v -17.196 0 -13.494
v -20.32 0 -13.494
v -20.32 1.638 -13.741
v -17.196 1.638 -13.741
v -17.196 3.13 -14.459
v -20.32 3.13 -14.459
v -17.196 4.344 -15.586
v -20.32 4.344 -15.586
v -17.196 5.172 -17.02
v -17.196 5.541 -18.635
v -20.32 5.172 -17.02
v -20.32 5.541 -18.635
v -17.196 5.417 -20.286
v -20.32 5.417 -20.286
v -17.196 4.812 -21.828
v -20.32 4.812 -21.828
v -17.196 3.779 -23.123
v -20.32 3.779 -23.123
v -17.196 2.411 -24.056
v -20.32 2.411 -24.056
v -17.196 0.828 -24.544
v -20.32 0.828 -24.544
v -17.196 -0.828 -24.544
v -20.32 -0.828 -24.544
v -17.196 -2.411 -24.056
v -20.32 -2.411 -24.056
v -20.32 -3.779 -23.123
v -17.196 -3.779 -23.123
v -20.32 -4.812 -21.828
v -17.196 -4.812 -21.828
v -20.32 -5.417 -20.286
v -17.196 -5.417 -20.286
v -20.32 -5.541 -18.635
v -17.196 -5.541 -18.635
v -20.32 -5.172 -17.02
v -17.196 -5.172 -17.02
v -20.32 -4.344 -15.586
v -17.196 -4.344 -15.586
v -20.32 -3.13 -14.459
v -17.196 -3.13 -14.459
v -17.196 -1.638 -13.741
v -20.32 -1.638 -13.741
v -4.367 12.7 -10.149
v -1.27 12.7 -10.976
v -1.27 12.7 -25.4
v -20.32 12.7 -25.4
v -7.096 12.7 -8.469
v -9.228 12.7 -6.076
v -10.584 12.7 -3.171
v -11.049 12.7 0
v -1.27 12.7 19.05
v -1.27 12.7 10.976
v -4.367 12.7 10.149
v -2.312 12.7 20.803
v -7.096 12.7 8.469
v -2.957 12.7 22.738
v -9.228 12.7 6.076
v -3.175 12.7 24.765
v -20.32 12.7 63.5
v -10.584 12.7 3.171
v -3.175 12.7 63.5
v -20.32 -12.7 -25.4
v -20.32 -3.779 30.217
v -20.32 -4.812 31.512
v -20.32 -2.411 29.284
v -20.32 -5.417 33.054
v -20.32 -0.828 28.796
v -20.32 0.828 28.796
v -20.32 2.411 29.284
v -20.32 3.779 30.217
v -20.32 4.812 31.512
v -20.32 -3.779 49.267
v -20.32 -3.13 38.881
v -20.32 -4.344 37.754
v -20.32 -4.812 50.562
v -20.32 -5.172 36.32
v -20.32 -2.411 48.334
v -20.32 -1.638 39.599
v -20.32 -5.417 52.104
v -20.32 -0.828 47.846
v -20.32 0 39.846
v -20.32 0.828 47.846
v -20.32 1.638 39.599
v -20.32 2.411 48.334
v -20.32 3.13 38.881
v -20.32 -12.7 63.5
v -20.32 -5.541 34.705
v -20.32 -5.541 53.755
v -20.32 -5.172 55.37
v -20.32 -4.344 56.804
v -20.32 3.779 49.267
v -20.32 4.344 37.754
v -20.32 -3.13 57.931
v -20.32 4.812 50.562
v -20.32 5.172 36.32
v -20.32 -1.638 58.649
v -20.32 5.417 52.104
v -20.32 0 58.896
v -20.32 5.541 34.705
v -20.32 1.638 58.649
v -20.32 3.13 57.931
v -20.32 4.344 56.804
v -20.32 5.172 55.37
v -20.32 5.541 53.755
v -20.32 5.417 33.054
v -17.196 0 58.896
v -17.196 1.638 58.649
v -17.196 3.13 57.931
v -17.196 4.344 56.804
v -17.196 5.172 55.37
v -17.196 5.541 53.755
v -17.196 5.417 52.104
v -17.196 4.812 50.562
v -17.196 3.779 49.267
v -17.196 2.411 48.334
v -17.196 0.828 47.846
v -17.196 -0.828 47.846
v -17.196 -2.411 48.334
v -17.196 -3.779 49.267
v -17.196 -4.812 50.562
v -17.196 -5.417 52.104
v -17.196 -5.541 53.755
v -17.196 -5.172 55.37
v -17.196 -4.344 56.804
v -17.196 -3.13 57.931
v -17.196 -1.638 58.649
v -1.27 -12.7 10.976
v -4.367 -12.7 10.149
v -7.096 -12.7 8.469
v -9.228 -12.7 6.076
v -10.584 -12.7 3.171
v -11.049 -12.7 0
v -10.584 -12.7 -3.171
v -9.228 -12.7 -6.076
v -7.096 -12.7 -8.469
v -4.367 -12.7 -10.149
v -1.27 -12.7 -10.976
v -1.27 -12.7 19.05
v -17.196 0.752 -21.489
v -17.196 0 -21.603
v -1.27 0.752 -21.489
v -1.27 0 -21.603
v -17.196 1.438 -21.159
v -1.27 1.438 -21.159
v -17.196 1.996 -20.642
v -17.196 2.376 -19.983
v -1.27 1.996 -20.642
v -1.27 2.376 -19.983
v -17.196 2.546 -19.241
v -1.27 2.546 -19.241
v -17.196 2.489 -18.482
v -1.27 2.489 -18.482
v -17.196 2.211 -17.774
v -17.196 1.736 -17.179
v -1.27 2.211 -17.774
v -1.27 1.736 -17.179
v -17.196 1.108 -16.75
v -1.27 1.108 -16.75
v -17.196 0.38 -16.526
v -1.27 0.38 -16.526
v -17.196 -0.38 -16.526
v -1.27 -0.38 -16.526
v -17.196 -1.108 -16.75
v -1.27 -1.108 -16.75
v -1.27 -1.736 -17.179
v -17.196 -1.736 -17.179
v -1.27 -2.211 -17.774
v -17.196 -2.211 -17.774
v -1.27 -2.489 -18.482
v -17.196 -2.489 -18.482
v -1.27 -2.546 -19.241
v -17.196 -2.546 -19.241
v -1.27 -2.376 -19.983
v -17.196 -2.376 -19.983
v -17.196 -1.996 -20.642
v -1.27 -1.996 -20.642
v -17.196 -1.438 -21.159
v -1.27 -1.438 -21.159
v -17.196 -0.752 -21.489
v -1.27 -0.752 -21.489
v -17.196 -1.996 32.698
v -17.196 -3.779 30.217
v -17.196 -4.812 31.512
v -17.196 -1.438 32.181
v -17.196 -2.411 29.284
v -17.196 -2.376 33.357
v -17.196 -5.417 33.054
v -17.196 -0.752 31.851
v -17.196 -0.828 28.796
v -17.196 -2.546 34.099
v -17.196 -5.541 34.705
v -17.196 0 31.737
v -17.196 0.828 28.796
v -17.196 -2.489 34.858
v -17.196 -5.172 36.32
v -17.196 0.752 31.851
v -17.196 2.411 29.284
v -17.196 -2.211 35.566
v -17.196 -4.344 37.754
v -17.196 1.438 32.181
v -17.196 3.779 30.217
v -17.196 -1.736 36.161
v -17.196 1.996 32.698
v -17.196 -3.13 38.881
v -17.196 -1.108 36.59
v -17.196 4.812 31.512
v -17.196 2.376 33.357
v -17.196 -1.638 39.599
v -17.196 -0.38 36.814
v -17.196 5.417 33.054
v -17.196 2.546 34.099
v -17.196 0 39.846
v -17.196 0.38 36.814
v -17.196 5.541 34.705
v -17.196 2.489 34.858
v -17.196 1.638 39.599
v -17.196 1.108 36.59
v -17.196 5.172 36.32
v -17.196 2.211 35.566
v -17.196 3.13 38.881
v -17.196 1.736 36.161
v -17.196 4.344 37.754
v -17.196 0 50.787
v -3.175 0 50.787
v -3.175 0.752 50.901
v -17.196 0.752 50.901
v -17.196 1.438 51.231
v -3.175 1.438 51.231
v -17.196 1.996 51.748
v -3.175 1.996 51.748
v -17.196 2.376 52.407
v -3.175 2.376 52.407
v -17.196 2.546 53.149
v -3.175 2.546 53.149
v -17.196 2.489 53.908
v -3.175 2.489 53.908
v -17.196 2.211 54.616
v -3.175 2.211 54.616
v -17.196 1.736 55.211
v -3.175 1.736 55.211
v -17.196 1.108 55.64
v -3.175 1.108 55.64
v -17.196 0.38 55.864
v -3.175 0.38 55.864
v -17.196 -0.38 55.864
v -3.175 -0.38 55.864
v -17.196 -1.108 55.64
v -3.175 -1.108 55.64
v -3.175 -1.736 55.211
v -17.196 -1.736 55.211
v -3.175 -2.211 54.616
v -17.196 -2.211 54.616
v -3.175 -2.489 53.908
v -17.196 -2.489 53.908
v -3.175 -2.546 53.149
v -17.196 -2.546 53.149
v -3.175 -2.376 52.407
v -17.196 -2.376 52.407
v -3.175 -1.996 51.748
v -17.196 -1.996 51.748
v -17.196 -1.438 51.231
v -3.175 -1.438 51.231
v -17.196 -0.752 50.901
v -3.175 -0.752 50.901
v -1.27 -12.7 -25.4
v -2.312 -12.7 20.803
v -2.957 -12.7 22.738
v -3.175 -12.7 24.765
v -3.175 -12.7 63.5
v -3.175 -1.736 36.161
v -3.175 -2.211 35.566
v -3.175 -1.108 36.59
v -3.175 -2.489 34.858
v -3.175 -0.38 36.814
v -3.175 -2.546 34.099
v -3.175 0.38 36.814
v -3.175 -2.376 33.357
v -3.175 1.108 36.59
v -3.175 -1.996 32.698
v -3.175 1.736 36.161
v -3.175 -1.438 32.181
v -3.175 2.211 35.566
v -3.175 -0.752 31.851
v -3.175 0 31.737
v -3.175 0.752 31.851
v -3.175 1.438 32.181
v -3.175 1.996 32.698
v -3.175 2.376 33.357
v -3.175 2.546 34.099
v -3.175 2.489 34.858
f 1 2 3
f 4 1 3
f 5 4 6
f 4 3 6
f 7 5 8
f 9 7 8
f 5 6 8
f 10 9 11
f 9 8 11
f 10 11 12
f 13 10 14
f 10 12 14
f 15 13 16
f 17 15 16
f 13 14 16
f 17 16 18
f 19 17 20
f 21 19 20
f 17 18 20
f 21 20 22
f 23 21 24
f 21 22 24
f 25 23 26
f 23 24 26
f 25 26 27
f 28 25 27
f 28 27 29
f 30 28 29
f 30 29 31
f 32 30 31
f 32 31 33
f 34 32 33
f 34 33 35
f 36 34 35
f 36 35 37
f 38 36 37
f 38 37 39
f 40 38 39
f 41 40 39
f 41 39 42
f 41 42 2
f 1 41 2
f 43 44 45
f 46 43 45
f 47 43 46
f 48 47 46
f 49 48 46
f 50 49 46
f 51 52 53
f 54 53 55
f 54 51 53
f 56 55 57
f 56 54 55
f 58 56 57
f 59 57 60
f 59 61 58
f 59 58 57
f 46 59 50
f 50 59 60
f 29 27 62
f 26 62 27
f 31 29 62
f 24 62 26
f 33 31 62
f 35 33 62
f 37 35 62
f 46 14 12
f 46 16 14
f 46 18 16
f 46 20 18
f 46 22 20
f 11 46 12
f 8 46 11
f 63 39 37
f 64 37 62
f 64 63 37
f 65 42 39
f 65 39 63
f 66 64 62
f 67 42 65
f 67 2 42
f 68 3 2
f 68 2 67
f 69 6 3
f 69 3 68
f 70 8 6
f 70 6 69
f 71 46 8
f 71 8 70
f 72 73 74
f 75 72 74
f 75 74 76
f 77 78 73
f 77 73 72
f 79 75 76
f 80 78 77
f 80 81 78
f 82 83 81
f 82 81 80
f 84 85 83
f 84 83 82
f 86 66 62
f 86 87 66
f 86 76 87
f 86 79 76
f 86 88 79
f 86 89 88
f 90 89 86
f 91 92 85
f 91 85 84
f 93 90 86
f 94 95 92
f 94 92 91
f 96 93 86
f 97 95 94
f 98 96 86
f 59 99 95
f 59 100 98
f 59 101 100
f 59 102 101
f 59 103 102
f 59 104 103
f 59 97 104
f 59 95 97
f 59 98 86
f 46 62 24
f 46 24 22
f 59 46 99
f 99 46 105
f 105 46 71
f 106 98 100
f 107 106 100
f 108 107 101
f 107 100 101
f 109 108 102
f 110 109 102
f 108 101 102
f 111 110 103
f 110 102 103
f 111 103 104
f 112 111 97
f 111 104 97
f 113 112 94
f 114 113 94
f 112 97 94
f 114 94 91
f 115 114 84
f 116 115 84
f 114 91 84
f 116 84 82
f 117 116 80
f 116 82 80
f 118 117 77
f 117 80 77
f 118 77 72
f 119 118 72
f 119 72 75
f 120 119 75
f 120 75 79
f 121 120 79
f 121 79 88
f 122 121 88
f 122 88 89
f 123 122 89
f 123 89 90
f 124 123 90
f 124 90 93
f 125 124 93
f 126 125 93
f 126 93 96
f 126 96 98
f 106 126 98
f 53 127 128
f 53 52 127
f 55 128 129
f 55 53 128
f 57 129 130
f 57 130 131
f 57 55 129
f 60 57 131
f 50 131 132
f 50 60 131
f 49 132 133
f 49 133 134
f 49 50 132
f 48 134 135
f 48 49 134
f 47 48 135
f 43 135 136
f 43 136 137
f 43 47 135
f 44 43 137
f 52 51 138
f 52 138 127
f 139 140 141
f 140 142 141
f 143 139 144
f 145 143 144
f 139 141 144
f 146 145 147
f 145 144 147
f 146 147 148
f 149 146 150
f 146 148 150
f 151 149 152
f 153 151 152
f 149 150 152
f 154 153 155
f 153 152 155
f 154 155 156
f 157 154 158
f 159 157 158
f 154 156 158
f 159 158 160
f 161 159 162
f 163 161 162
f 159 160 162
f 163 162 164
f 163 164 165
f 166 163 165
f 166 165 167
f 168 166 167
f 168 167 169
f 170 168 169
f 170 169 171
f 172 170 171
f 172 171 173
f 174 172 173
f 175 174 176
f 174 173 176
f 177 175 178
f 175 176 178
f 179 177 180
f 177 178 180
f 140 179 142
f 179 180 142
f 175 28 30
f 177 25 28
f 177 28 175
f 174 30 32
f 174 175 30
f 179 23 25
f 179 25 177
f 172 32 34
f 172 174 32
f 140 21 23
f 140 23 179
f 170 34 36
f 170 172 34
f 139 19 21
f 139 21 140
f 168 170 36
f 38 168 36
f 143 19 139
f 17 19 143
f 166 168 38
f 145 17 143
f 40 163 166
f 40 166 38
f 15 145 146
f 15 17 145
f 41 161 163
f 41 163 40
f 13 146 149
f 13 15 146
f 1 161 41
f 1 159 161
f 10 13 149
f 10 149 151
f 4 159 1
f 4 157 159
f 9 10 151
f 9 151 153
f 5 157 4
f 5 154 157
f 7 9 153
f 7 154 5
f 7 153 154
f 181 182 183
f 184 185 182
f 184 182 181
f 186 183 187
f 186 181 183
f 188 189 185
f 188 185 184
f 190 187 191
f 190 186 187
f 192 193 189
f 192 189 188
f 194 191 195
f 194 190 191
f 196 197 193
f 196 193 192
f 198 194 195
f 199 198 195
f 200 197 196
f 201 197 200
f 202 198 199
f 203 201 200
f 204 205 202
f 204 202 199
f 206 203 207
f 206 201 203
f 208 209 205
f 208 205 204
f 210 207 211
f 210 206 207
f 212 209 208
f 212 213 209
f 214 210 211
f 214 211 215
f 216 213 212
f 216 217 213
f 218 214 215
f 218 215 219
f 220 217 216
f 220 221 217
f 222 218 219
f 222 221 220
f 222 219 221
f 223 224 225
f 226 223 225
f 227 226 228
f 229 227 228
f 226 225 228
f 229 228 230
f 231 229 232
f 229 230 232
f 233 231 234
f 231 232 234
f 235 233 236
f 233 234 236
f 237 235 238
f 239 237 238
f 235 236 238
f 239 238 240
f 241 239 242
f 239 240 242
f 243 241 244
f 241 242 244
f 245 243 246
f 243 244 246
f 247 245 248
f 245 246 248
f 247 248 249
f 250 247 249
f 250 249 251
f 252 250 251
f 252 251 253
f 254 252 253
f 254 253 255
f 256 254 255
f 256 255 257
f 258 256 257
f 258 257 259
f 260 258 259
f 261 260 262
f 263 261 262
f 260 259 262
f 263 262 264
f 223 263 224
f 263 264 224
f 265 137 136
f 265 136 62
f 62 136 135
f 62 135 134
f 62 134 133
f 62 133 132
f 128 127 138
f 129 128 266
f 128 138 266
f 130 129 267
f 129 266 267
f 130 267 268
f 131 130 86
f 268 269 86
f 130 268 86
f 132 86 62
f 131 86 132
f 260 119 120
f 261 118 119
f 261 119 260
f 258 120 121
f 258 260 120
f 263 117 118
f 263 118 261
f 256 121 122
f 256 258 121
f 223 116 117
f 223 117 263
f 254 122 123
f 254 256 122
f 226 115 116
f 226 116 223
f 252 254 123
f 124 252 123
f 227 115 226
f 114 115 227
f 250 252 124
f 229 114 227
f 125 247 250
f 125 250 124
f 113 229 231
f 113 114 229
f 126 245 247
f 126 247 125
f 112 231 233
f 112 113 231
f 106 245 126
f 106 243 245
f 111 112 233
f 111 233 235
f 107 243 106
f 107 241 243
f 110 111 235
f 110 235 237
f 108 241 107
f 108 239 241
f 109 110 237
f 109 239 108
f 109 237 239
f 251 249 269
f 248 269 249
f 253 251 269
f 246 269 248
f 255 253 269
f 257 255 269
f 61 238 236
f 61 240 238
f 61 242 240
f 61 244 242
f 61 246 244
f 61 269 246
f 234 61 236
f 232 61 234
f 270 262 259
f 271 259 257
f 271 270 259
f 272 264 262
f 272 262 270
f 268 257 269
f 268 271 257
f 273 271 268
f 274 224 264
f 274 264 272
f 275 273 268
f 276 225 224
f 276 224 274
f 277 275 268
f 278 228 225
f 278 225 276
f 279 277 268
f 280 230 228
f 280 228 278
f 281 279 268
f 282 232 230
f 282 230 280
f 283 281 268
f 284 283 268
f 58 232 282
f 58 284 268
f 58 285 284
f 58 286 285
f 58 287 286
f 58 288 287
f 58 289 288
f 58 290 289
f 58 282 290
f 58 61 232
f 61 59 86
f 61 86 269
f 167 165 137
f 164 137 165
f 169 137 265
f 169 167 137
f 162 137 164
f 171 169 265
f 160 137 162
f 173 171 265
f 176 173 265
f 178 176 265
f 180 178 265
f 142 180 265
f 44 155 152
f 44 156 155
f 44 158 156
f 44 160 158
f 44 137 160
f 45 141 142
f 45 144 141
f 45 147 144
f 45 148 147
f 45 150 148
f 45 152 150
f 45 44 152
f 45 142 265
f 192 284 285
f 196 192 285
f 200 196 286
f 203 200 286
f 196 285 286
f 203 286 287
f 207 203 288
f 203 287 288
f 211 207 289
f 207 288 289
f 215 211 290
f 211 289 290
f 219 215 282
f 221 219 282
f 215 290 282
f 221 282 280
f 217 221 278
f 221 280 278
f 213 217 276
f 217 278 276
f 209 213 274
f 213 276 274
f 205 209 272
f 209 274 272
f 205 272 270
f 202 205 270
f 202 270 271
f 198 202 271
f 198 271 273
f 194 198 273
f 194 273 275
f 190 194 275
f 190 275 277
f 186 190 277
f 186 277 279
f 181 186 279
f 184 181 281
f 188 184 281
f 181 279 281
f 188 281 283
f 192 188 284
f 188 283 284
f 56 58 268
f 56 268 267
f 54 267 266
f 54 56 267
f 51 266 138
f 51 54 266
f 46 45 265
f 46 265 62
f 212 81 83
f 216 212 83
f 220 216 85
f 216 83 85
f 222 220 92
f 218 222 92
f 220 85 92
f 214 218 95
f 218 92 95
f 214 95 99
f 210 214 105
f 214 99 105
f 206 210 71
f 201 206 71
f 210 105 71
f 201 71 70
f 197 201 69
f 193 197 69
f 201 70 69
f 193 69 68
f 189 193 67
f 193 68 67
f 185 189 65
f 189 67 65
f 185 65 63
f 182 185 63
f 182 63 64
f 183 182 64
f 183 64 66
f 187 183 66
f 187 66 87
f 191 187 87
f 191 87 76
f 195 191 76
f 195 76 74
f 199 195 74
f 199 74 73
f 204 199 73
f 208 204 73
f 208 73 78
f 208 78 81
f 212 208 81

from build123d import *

# Parameters (mm, degrees)
BOSS_EXTRUDE1_DEPTH                                 = 12.7
CBORE_FOR_10_BINDING_HEAD_MACHINE_SCREW_D           = 5.1054
CBORE_FOR_10_BINDING_HEAD_MACHINE_SCREW_DEPTH       = 508
CBORE_FOR_10_BINDING_HEAD_MACHINE_SCREW_CBORE_D     = 11.1125
CBORE_FOR_10_BINDING_HEAD_MACHINE_SCREW_CBORE_DEPTH = 3.1242
CBORE_FOR_10_BINDING_HEAD_MACHINE_SCREW_TIP         = 1.533816902
SKETCH7_W                                           = 1.905
SKETCH7_H                                           = 44.45
CUT_EXTRUDE1_DEPTH                                  = 72.346425278
FILLET1_R                                           = 9.525


with BuildPart() as part:
    # Sketch1 → Boss-Extrude1 (new, symmetric)
    with BuildSketch(Plane(origin=(0, 0, 0), x_dir=(1, 0, 0), z_dir=(0, 1, 0))):
        with BuildLine():
            Line((-1.27, 10.975768811), (-1.27, 25.4))
            Line((-1.27, 25.4), (-20.32, 25.4))
            Line((-20.32, 25.4), (-20.32, -63.5))
            Line((-20.32, -63.5), (-1.27, -63.5))
            Line((-1.27, -63.5), (-1.27, -10.975768811))
            ThreePointArc((-1.27, -10.975768811), (-11.049, 0), (-1.27, 10.975768811))
        make_face()
    extrude(amount=BOSS_EXTRUDE1_DEPTH, both=True)

    # CBORE for #10 Binding Head Machine Screw1
    with Locations(Plane.ZY.offset(20.32)):
        with Locations((-19.05, 0), (34.29, 0), (53.34, 0)):
            CounterBoreHole(CBORE_FOR_10_BINDING_HEAD_MACHINE_SCREW_D / 2, CBORE_FOR_10_BINDING_HEAD_MACHINE_SCREW_CBORE_D / 2, CBORE_FOR_10_BINDING_HEAD_MACHINE_SCREW_CBORE_DEPTH, depth=CBORE_FOR_10_BINDING_HEAD_MACHINE_SCREW_DEPTH)
            with Locations((0, 0, -(CBORE_FOR_10_BINDING_HEAD_MACHINE_SCREW_DEPTH + CBORE_FOR_10_BINDING_HEAD_MACHINE_SCREW_TIP / 2))):  # 118° drill point
                Cone(0, CBORE_FOR_10_BINDING_HEAD_MACHINE_SCREW_D / 2, CBORE_FOR_10_BINDING_HEAD_MACHINE_SCREW_TIP, mode=Mode.SUBTRACT)

    # Sketch7 → Cut-Extrude1 (cut, through all)
    with BuildSketch(Plane(origin=(0, 12.7, 0), x_dir=(1, 0, 0), z_dir=(0, 1, 0))):
        with Locations((-2.2225, -41.275)):
            Rectangle(SKETCH7_W, SKETCH7_H)
    extrude(amount=-CUT_EXTRUDE1_DEPTH, mode=Mode.SUBTRACT)

    # Fillet1
    # the kernel refuses this fillet: 9.525 mm, written as the material it adds along each edge
    with BuildSketch(Plane(origin=(-3.175, 12.7, 19.05), x_dir=(1, 0, 0), z_dir=(0, -1, 0))) as fillet1_piece_1:
        with BuildLine():
            CenterArc((9.525, 5.715), FILLET1_R, 180, 36.869897646)
            Line((0, 5.715), (-0.1905, 5.715))
            Line((-0.1905, 5.715), (-0.1905, 0))
            Line((-0.1905, 0), (0, -0.1905))
            ThreePointArc((0, -0.1905), (0.9525, -0.1905), (1.7526, -0.1143))
            Line((1.7526, -0.1143), (1.905, 0))
        make_face()
    extrude(amount=25.4)


solid = part.part
